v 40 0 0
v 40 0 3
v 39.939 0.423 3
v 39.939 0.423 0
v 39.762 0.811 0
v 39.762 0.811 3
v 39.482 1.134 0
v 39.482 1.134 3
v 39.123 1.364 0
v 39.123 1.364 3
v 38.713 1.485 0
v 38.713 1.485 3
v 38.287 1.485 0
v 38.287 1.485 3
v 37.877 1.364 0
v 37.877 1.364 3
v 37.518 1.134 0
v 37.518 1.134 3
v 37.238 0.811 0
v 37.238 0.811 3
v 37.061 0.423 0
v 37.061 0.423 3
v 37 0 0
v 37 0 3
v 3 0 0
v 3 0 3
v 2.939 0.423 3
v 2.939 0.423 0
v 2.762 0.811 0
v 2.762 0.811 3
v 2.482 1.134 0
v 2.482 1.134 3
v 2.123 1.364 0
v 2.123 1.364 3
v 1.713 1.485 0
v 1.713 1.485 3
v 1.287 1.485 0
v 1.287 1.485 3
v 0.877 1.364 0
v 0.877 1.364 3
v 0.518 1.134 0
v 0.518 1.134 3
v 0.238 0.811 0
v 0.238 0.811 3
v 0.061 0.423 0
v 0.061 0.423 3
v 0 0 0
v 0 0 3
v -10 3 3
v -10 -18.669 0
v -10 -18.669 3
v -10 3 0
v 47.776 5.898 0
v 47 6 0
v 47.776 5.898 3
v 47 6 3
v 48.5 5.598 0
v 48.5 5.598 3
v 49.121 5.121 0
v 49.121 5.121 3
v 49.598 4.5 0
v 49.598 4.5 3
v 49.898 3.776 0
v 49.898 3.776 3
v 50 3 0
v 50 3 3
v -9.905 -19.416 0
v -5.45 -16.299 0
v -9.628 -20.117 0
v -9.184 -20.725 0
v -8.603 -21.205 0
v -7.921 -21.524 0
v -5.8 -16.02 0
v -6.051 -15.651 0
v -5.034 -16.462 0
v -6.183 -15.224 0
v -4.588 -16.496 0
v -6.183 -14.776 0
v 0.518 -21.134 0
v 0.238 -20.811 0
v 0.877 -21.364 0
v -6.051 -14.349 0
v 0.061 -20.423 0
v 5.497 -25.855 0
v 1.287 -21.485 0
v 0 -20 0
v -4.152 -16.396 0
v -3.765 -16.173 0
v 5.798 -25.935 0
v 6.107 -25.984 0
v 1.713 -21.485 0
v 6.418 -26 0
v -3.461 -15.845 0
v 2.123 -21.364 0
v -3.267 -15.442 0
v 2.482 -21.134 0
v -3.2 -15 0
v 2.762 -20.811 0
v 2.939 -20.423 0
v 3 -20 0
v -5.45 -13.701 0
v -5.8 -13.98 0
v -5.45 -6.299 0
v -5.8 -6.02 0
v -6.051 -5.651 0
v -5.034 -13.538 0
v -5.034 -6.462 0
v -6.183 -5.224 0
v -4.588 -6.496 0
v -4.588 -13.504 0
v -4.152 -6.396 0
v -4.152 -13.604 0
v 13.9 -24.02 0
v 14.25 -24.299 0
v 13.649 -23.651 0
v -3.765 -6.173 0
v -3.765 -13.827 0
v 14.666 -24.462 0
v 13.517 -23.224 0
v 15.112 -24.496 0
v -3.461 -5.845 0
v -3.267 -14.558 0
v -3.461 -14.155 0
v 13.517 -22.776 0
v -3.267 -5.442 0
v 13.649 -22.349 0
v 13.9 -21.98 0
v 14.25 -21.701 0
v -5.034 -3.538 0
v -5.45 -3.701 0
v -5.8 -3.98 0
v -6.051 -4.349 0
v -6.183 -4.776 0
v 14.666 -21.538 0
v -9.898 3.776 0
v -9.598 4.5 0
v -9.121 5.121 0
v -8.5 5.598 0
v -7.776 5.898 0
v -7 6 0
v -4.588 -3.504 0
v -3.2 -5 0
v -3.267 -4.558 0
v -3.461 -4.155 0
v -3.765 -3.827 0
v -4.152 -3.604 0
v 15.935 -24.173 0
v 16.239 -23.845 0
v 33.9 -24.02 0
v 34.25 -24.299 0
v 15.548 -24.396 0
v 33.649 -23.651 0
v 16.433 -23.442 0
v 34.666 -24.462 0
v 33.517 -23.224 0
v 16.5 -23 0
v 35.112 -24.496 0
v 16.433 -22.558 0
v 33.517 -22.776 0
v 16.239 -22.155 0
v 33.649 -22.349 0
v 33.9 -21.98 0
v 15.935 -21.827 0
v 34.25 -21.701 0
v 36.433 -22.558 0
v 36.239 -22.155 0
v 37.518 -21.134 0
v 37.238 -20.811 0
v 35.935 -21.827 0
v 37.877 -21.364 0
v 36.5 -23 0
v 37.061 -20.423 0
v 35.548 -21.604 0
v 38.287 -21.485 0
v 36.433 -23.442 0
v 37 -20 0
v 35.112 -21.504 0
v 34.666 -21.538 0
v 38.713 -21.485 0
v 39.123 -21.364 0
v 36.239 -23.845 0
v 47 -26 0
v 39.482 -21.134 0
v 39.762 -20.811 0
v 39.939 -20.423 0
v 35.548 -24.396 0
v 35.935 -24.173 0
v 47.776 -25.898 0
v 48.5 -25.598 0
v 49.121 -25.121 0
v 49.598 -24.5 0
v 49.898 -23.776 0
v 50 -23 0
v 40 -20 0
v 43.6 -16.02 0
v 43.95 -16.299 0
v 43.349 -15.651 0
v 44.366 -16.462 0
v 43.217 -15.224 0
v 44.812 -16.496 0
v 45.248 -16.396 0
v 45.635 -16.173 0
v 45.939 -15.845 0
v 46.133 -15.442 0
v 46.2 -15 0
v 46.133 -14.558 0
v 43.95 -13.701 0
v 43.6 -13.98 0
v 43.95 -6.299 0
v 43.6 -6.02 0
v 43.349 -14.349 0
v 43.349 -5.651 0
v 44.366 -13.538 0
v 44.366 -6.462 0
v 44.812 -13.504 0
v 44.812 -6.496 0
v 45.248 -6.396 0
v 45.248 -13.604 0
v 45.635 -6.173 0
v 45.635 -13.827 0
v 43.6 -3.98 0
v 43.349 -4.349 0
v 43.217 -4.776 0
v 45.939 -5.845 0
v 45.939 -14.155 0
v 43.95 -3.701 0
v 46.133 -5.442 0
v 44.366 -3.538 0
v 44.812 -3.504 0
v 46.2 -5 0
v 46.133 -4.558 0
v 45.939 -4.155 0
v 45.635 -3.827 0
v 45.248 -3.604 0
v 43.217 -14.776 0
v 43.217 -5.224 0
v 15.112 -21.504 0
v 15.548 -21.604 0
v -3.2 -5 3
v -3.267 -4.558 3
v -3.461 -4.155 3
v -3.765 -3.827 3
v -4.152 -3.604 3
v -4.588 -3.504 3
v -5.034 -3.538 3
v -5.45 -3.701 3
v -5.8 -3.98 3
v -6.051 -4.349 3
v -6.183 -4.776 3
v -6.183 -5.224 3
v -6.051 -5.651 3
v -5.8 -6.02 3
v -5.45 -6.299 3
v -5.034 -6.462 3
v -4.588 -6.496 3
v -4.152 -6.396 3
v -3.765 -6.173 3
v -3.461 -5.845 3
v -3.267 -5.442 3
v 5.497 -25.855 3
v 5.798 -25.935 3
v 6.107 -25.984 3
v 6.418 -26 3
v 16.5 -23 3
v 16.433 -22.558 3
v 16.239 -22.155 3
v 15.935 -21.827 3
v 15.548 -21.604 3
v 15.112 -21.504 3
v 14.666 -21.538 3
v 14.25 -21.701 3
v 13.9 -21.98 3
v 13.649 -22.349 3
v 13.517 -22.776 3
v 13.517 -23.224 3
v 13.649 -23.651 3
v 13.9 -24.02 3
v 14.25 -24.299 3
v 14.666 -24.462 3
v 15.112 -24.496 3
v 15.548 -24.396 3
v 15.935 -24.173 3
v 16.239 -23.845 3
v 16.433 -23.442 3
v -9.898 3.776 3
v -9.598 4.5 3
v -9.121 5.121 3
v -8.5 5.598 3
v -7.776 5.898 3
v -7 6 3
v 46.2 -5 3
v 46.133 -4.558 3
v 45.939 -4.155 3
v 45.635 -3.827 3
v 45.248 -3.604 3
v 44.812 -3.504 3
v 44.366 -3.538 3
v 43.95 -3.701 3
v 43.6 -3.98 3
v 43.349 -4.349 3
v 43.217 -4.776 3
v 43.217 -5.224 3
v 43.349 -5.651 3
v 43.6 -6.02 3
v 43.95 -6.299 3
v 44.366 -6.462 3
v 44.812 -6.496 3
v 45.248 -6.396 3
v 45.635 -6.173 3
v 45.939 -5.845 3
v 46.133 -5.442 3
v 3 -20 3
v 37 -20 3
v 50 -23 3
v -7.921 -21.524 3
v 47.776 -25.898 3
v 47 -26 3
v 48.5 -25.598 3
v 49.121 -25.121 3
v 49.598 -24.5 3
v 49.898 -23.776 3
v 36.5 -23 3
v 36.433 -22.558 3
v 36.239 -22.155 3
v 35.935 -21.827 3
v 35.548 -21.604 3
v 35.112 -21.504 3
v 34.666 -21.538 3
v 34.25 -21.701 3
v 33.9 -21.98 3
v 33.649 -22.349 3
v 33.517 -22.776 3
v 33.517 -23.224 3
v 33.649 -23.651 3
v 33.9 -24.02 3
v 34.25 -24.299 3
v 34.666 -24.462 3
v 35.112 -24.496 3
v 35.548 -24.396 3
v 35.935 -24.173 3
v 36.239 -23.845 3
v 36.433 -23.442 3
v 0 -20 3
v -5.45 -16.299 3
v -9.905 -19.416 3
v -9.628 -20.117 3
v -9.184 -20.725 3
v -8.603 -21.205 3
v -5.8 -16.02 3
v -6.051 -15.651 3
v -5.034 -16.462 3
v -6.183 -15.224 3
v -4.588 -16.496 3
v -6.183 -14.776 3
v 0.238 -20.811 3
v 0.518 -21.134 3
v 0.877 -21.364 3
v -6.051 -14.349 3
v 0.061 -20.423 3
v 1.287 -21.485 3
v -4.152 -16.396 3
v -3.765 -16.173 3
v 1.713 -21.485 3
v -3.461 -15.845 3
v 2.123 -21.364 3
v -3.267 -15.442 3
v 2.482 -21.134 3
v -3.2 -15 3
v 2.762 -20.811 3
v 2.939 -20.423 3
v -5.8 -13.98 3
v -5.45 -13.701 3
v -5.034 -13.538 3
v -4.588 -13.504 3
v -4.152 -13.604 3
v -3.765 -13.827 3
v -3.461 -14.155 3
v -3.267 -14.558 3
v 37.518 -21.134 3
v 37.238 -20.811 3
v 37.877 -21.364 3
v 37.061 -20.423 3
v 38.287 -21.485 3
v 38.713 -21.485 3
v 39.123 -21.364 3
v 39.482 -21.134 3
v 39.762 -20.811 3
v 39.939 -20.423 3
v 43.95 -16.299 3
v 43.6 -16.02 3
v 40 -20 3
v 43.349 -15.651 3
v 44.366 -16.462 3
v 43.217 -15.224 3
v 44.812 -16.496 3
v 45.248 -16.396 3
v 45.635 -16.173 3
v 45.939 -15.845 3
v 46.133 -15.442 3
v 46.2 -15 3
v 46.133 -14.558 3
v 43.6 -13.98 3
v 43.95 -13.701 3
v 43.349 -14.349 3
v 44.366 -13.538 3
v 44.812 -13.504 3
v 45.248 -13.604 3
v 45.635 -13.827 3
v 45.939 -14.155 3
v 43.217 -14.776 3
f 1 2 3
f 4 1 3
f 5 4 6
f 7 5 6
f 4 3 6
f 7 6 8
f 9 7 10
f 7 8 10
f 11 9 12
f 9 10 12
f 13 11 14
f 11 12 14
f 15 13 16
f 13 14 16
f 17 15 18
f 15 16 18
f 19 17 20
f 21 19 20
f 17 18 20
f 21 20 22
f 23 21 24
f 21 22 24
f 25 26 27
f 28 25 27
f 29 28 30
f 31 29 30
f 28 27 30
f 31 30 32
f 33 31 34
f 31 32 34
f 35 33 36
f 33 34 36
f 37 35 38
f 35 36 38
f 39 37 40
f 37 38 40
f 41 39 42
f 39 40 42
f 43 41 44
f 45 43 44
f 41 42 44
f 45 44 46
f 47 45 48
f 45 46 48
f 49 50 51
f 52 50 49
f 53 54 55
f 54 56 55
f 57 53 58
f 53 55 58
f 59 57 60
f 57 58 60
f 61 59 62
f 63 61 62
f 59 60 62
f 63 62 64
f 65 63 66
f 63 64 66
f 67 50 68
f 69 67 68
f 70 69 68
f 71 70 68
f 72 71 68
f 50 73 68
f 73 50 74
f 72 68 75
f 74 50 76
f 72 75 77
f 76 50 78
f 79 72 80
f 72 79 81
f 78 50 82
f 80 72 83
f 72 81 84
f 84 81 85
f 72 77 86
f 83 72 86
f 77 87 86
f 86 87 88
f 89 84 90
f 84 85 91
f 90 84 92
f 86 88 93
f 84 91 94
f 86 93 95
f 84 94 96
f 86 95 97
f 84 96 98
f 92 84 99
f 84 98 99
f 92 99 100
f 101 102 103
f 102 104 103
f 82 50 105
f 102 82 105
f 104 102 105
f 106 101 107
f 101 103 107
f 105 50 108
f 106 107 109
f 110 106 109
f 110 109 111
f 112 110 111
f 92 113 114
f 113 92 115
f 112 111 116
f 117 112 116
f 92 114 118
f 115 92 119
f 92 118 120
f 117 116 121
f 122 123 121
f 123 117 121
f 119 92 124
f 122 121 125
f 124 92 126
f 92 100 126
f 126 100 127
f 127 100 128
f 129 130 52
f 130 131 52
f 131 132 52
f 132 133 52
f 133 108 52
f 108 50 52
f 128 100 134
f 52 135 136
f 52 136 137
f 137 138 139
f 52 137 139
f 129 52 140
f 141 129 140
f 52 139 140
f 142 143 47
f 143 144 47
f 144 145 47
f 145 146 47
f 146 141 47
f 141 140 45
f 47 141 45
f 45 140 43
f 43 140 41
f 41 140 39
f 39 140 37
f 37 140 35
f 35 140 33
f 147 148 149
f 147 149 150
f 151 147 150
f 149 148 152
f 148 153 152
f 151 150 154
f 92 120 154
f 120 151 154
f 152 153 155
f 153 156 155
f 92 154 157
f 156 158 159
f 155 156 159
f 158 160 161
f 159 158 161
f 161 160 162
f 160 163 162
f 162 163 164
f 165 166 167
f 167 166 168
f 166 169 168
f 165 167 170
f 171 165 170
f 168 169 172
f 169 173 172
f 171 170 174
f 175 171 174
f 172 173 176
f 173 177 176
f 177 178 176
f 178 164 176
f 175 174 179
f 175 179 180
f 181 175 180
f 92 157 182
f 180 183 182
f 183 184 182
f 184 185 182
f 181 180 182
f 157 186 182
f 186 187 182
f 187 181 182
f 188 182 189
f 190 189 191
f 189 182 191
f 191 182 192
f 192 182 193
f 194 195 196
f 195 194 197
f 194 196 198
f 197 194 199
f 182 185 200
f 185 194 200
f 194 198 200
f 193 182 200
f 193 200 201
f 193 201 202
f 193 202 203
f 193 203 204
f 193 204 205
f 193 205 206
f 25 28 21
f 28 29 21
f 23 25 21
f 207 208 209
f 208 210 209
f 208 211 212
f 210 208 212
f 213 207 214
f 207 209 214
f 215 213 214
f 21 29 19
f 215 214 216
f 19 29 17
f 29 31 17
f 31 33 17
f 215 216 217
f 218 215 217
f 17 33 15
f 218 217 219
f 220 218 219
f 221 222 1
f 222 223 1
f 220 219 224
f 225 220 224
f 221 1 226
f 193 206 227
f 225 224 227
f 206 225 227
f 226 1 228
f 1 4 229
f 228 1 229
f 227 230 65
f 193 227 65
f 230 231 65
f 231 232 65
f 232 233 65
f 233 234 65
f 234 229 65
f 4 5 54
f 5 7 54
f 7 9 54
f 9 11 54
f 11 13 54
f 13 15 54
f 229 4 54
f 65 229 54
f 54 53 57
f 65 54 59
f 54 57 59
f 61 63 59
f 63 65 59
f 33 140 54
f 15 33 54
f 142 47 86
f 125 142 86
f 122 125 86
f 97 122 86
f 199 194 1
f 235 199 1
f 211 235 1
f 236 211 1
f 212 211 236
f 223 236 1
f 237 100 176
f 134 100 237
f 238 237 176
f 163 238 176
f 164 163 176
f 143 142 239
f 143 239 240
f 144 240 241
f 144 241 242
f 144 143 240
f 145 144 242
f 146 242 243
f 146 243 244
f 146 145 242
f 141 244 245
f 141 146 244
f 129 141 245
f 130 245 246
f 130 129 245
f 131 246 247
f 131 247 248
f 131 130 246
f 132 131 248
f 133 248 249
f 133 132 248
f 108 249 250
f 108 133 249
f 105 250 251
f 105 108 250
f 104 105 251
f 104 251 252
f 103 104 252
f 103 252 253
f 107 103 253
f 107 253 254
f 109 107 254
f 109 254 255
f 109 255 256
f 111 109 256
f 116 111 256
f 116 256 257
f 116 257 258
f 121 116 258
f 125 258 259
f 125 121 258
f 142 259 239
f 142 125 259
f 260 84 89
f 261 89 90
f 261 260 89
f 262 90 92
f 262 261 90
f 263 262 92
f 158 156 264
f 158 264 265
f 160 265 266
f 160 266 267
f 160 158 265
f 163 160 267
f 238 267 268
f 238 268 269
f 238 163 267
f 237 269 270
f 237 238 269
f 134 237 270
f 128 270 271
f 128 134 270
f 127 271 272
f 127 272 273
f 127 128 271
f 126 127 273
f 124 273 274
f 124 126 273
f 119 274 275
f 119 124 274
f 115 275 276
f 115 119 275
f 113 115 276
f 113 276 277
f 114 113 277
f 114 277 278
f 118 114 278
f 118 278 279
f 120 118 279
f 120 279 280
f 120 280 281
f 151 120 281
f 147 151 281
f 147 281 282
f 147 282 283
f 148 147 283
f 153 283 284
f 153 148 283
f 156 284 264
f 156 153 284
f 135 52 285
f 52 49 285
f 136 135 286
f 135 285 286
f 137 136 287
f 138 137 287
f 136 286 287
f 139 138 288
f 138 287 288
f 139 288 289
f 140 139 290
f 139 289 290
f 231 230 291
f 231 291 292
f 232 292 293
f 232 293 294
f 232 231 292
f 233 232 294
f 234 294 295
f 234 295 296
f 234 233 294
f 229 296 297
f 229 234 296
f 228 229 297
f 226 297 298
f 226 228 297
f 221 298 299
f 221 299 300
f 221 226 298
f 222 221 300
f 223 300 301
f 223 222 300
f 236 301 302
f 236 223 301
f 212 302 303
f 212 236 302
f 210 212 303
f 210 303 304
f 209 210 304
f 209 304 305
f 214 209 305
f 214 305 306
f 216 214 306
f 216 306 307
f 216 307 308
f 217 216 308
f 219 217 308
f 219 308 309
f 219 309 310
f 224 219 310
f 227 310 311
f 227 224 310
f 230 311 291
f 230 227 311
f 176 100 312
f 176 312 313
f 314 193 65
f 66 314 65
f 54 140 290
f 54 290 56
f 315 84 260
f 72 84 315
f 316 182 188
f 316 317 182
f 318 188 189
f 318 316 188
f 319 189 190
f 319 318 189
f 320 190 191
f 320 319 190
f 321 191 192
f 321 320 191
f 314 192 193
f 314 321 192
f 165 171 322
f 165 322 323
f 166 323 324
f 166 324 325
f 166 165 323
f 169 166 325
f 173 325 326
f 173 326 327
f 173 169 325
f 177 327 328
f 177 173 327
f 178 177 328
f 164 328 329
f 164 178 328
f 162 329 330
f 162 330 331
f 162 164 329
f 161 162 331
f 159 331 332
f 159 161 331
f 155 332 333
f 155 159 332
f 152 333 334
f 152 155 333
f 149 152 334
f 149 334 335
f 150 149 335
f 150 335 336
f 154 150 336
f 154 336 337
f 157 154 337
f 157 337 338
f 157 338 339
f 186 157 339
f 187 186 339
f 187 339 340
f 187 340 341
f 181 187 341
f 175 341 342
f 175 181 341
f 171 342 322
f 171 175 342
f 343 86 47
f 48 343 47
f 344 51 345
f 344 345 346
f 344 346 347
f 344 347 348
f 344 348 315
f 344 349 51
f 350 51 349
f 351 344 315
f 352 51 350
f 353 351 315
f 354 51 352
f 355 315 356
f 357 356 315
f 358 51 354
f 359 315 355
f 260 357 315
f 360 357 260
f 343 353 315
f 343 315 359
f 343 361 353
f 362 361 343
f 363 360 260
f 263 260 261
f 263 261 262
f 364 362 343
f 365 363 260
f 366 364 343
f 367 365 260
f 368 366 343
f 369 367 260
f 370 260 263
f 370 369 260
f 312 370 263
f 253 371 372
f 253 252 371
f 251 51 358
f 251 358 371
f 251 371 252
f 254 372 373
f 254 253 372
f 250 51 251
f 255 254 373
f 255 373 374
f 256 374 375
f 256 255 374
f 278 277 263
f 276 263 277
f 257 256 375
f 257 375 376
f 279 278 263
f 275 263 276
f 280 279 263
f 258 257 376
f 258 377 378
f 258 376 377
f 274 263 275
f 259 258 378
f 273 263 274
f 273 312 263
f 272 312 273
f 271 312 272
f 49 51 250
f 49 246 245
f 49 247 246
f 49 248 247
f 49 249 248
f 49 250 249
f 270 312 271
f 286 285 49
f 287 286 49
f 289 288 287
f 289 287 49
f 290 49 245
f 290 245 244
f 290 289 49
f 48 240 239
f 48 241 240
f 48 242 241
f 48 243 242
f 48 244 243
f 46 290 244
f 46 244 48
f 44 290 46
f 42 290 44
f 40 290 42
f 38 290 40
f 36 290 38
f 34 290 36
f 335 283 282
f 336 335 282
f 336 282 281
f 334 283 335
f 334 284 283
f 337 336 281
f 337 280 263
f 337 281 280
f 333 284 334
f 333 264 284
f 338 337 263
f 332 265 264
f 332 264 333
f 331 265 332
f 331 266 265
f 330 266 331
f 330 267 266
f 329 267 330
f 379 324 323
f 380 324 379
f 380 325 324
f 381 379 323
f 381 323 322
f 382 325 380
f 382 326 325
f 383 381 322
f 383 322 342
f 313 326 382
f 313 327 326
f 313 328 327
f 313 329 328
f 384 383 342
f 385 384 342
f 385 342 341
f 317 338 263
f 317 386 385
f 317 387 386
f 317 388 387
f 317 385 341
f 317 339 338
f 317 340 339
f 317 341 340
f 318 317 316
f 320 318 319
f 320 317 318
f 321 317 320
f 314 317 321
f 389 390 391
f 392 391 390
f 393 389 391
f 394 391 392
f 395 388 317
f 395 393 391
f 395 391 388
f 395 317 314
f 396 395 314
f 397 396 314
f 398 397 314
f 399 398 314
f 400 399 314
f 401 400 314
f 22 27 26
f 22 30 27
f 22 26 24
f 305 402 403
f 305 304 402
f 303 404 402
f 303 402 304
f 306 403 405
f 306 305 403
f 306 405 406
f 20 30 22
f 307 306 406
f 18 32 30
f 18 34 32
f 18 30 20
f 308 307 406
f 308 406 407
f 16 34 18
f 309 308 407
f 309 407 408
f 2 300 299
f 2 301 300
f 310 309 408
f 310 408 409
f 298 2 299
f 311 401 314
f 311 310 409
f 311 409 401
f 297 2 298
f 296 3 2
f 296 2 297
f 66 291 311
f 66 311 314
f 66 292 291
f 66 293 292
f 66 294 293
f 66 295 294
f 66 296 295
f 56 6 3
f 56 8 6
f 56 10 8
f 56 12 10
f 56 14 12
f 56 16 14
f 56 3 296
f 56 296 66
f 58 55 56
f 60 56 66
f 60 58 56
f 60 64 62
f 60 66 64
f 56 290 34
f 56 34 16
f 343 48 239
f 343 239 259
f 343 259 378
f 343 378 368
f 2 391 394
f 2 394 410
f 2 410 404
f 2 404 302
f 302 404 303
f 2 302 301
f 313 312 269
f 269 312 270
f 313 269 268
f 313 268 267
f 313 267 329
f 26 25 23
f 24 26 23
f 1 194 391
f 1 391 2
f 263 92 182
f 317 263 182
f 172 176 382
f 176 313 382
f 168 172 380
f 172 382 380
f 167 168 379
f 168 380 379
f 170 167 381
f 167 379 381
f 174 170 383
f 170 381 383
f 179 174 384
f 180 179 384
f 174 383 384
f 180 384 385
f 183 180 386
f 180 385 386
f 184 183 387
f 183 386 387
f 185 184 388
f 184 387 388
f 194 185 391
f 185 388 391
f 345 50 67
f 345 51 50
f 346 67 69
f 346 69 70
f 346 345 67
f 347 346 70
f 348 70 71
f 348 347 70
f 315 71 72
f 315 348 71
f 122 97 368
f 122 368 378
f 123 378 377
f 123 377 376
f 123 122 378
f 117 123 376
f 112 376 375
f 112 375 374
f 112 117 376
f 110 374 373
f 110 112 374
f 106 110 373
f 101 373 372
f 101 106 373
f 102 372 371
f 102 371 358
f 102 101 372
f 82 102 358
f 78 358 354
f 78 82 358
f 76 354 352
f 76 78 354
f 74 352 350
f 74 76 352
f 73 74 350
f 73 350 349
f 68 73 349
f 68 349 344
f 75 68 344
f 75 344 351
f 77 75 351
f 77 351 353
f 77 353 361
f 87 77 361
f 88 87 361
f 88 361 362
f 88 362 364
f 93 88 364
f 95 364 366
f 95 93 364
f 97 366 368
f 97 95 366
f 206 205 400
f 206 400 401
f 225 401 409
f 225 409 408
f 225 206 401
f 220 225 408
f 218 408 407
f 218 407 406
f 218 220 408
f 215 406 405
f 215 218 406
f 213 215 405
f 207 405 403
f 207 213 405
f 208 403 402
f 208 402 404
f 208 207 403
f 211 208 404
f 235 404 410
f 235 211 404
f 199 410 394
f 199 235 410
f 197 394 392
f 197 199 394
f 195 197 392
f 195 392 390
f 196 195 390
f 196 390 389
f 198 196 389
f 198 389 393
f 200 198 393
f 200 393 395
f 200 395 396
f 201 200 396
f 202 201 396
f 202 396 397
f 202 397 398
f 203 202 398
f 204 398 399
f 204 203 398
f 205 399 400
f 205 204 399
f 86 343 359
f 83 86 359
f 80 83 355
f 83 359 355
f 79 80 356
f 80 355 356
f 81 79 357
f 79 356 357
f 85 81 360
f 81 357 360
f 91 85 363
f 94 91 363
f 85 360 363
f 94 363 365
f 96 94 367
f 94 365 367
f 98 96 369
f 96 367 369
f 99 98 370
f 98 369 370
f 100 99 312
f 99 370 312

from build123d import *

# Parameters (mm, degrees)
SKETCH_1_W          = 60
SKETCH_1_H          = 32
SKETCH_1_R          = 1.5
SKETCH_1_W_2        = 40
SKETCH_1_H_2        = 20
EXTRUDE_1_DEPTH     = 3
SKETCH_2_R          = 1.5
CUT_EXTRUDE_1_DEPTH = 3
FILLET_1_R          = 3
CUT_EXTRUDE_2_DEPTH = 10
FILLET_2_R          = 3


with BuildPart() as part:
    # 草图1 → 凸台-拉伸1 (new body)
    with BuildSketch(Plane.XY):
        with Locations((20, -10)):
            Rectangle(SKETCH_1_W, SKETCH_1_H)
        with Locations((-4.7, -5)):
            Circle(SKETCH_1_R, mode=Mode.SUBTRACT)
        with Locations((-4.7, -15)):
            Circle(SKETCH_1_R, mode=Mode.SUBTRACT)
        with Locations((44.7, -5)):
            Circle(SKETCH_1_R, mode=Mode.SUBTRACT)
        with Locations((44.7, -15)):
            Circle(SKETCH_1_R, mode=Mode.SUBTRACT)
        with Locations((35, -23)):
            Circle(SKETCH_1_R, mode=Mode.SUBTRACT)
        with Locations((15, -23)):
            Circle(SKETCH_1_R, mode=Mode.SUBTRACT)
        with Locations((20, -10)):
            Rectangle(SKETCH_1_W_2, SKETCH_1_H_2, mode=Mode.SUBTRACT)
    extrude(amount=EXTRUDE_1_DEPTH)

    # 草图2 → 切除-拉伸1 (cut)
    with BuildSketch(Plane.XY.offset(3)):
        with Locations((1.5, 0)):
            Circle(SKETCH_2_R)
        with Locations((38.5, 0)):
            Circle(SKETCH_2_R)
        with Locations((38.5, -20)):
            Circle(SKETCH_2_R)
        with Locations((1.5, -20)):
            Circle(SKETCH_2_R)
    extrude(amount=-CUT_EXTRUDE_1_DEPTH, mode=Mode.SUBTRACT)

    # 圆角1
    fillet_1_edges = [part.edges().sort_by_distance(p)[0] for p in [
        (-10, 6, 1.5),
        (50, 6, 1.5),
        (50, -26, 1.5),
        (-10, -26, 1.5),
    ]]
    fillet(fillet_1_edges, radius=FILLET_1_R)

    # 草图3 → 切除-拉伸2 (cut)
    with BuildSketch(Plane(origin=(0, 0, 0), x_dir=(-1, 0, 0), z_dir=(0, 0, -1))):
        Polygon((-5.9461814, -26), (10, -20.853371157), (15.489211813, -37.273669186), align=None)
    extrude(amount=-CUT_EXTRUDE_2_DEPTH, mode=Mode.SUBTRACT)

    # 圆角2
    fillet_2_edges = [part.edges().sort_by_distance(p)[0] for p in [
        (5.9461814, -26, 1.5),
        (-10, -20.853371157, 1.5),
    ]]
    fillet(fillet_2_edges, radius=FILLET_2_R)


solid = part.part
